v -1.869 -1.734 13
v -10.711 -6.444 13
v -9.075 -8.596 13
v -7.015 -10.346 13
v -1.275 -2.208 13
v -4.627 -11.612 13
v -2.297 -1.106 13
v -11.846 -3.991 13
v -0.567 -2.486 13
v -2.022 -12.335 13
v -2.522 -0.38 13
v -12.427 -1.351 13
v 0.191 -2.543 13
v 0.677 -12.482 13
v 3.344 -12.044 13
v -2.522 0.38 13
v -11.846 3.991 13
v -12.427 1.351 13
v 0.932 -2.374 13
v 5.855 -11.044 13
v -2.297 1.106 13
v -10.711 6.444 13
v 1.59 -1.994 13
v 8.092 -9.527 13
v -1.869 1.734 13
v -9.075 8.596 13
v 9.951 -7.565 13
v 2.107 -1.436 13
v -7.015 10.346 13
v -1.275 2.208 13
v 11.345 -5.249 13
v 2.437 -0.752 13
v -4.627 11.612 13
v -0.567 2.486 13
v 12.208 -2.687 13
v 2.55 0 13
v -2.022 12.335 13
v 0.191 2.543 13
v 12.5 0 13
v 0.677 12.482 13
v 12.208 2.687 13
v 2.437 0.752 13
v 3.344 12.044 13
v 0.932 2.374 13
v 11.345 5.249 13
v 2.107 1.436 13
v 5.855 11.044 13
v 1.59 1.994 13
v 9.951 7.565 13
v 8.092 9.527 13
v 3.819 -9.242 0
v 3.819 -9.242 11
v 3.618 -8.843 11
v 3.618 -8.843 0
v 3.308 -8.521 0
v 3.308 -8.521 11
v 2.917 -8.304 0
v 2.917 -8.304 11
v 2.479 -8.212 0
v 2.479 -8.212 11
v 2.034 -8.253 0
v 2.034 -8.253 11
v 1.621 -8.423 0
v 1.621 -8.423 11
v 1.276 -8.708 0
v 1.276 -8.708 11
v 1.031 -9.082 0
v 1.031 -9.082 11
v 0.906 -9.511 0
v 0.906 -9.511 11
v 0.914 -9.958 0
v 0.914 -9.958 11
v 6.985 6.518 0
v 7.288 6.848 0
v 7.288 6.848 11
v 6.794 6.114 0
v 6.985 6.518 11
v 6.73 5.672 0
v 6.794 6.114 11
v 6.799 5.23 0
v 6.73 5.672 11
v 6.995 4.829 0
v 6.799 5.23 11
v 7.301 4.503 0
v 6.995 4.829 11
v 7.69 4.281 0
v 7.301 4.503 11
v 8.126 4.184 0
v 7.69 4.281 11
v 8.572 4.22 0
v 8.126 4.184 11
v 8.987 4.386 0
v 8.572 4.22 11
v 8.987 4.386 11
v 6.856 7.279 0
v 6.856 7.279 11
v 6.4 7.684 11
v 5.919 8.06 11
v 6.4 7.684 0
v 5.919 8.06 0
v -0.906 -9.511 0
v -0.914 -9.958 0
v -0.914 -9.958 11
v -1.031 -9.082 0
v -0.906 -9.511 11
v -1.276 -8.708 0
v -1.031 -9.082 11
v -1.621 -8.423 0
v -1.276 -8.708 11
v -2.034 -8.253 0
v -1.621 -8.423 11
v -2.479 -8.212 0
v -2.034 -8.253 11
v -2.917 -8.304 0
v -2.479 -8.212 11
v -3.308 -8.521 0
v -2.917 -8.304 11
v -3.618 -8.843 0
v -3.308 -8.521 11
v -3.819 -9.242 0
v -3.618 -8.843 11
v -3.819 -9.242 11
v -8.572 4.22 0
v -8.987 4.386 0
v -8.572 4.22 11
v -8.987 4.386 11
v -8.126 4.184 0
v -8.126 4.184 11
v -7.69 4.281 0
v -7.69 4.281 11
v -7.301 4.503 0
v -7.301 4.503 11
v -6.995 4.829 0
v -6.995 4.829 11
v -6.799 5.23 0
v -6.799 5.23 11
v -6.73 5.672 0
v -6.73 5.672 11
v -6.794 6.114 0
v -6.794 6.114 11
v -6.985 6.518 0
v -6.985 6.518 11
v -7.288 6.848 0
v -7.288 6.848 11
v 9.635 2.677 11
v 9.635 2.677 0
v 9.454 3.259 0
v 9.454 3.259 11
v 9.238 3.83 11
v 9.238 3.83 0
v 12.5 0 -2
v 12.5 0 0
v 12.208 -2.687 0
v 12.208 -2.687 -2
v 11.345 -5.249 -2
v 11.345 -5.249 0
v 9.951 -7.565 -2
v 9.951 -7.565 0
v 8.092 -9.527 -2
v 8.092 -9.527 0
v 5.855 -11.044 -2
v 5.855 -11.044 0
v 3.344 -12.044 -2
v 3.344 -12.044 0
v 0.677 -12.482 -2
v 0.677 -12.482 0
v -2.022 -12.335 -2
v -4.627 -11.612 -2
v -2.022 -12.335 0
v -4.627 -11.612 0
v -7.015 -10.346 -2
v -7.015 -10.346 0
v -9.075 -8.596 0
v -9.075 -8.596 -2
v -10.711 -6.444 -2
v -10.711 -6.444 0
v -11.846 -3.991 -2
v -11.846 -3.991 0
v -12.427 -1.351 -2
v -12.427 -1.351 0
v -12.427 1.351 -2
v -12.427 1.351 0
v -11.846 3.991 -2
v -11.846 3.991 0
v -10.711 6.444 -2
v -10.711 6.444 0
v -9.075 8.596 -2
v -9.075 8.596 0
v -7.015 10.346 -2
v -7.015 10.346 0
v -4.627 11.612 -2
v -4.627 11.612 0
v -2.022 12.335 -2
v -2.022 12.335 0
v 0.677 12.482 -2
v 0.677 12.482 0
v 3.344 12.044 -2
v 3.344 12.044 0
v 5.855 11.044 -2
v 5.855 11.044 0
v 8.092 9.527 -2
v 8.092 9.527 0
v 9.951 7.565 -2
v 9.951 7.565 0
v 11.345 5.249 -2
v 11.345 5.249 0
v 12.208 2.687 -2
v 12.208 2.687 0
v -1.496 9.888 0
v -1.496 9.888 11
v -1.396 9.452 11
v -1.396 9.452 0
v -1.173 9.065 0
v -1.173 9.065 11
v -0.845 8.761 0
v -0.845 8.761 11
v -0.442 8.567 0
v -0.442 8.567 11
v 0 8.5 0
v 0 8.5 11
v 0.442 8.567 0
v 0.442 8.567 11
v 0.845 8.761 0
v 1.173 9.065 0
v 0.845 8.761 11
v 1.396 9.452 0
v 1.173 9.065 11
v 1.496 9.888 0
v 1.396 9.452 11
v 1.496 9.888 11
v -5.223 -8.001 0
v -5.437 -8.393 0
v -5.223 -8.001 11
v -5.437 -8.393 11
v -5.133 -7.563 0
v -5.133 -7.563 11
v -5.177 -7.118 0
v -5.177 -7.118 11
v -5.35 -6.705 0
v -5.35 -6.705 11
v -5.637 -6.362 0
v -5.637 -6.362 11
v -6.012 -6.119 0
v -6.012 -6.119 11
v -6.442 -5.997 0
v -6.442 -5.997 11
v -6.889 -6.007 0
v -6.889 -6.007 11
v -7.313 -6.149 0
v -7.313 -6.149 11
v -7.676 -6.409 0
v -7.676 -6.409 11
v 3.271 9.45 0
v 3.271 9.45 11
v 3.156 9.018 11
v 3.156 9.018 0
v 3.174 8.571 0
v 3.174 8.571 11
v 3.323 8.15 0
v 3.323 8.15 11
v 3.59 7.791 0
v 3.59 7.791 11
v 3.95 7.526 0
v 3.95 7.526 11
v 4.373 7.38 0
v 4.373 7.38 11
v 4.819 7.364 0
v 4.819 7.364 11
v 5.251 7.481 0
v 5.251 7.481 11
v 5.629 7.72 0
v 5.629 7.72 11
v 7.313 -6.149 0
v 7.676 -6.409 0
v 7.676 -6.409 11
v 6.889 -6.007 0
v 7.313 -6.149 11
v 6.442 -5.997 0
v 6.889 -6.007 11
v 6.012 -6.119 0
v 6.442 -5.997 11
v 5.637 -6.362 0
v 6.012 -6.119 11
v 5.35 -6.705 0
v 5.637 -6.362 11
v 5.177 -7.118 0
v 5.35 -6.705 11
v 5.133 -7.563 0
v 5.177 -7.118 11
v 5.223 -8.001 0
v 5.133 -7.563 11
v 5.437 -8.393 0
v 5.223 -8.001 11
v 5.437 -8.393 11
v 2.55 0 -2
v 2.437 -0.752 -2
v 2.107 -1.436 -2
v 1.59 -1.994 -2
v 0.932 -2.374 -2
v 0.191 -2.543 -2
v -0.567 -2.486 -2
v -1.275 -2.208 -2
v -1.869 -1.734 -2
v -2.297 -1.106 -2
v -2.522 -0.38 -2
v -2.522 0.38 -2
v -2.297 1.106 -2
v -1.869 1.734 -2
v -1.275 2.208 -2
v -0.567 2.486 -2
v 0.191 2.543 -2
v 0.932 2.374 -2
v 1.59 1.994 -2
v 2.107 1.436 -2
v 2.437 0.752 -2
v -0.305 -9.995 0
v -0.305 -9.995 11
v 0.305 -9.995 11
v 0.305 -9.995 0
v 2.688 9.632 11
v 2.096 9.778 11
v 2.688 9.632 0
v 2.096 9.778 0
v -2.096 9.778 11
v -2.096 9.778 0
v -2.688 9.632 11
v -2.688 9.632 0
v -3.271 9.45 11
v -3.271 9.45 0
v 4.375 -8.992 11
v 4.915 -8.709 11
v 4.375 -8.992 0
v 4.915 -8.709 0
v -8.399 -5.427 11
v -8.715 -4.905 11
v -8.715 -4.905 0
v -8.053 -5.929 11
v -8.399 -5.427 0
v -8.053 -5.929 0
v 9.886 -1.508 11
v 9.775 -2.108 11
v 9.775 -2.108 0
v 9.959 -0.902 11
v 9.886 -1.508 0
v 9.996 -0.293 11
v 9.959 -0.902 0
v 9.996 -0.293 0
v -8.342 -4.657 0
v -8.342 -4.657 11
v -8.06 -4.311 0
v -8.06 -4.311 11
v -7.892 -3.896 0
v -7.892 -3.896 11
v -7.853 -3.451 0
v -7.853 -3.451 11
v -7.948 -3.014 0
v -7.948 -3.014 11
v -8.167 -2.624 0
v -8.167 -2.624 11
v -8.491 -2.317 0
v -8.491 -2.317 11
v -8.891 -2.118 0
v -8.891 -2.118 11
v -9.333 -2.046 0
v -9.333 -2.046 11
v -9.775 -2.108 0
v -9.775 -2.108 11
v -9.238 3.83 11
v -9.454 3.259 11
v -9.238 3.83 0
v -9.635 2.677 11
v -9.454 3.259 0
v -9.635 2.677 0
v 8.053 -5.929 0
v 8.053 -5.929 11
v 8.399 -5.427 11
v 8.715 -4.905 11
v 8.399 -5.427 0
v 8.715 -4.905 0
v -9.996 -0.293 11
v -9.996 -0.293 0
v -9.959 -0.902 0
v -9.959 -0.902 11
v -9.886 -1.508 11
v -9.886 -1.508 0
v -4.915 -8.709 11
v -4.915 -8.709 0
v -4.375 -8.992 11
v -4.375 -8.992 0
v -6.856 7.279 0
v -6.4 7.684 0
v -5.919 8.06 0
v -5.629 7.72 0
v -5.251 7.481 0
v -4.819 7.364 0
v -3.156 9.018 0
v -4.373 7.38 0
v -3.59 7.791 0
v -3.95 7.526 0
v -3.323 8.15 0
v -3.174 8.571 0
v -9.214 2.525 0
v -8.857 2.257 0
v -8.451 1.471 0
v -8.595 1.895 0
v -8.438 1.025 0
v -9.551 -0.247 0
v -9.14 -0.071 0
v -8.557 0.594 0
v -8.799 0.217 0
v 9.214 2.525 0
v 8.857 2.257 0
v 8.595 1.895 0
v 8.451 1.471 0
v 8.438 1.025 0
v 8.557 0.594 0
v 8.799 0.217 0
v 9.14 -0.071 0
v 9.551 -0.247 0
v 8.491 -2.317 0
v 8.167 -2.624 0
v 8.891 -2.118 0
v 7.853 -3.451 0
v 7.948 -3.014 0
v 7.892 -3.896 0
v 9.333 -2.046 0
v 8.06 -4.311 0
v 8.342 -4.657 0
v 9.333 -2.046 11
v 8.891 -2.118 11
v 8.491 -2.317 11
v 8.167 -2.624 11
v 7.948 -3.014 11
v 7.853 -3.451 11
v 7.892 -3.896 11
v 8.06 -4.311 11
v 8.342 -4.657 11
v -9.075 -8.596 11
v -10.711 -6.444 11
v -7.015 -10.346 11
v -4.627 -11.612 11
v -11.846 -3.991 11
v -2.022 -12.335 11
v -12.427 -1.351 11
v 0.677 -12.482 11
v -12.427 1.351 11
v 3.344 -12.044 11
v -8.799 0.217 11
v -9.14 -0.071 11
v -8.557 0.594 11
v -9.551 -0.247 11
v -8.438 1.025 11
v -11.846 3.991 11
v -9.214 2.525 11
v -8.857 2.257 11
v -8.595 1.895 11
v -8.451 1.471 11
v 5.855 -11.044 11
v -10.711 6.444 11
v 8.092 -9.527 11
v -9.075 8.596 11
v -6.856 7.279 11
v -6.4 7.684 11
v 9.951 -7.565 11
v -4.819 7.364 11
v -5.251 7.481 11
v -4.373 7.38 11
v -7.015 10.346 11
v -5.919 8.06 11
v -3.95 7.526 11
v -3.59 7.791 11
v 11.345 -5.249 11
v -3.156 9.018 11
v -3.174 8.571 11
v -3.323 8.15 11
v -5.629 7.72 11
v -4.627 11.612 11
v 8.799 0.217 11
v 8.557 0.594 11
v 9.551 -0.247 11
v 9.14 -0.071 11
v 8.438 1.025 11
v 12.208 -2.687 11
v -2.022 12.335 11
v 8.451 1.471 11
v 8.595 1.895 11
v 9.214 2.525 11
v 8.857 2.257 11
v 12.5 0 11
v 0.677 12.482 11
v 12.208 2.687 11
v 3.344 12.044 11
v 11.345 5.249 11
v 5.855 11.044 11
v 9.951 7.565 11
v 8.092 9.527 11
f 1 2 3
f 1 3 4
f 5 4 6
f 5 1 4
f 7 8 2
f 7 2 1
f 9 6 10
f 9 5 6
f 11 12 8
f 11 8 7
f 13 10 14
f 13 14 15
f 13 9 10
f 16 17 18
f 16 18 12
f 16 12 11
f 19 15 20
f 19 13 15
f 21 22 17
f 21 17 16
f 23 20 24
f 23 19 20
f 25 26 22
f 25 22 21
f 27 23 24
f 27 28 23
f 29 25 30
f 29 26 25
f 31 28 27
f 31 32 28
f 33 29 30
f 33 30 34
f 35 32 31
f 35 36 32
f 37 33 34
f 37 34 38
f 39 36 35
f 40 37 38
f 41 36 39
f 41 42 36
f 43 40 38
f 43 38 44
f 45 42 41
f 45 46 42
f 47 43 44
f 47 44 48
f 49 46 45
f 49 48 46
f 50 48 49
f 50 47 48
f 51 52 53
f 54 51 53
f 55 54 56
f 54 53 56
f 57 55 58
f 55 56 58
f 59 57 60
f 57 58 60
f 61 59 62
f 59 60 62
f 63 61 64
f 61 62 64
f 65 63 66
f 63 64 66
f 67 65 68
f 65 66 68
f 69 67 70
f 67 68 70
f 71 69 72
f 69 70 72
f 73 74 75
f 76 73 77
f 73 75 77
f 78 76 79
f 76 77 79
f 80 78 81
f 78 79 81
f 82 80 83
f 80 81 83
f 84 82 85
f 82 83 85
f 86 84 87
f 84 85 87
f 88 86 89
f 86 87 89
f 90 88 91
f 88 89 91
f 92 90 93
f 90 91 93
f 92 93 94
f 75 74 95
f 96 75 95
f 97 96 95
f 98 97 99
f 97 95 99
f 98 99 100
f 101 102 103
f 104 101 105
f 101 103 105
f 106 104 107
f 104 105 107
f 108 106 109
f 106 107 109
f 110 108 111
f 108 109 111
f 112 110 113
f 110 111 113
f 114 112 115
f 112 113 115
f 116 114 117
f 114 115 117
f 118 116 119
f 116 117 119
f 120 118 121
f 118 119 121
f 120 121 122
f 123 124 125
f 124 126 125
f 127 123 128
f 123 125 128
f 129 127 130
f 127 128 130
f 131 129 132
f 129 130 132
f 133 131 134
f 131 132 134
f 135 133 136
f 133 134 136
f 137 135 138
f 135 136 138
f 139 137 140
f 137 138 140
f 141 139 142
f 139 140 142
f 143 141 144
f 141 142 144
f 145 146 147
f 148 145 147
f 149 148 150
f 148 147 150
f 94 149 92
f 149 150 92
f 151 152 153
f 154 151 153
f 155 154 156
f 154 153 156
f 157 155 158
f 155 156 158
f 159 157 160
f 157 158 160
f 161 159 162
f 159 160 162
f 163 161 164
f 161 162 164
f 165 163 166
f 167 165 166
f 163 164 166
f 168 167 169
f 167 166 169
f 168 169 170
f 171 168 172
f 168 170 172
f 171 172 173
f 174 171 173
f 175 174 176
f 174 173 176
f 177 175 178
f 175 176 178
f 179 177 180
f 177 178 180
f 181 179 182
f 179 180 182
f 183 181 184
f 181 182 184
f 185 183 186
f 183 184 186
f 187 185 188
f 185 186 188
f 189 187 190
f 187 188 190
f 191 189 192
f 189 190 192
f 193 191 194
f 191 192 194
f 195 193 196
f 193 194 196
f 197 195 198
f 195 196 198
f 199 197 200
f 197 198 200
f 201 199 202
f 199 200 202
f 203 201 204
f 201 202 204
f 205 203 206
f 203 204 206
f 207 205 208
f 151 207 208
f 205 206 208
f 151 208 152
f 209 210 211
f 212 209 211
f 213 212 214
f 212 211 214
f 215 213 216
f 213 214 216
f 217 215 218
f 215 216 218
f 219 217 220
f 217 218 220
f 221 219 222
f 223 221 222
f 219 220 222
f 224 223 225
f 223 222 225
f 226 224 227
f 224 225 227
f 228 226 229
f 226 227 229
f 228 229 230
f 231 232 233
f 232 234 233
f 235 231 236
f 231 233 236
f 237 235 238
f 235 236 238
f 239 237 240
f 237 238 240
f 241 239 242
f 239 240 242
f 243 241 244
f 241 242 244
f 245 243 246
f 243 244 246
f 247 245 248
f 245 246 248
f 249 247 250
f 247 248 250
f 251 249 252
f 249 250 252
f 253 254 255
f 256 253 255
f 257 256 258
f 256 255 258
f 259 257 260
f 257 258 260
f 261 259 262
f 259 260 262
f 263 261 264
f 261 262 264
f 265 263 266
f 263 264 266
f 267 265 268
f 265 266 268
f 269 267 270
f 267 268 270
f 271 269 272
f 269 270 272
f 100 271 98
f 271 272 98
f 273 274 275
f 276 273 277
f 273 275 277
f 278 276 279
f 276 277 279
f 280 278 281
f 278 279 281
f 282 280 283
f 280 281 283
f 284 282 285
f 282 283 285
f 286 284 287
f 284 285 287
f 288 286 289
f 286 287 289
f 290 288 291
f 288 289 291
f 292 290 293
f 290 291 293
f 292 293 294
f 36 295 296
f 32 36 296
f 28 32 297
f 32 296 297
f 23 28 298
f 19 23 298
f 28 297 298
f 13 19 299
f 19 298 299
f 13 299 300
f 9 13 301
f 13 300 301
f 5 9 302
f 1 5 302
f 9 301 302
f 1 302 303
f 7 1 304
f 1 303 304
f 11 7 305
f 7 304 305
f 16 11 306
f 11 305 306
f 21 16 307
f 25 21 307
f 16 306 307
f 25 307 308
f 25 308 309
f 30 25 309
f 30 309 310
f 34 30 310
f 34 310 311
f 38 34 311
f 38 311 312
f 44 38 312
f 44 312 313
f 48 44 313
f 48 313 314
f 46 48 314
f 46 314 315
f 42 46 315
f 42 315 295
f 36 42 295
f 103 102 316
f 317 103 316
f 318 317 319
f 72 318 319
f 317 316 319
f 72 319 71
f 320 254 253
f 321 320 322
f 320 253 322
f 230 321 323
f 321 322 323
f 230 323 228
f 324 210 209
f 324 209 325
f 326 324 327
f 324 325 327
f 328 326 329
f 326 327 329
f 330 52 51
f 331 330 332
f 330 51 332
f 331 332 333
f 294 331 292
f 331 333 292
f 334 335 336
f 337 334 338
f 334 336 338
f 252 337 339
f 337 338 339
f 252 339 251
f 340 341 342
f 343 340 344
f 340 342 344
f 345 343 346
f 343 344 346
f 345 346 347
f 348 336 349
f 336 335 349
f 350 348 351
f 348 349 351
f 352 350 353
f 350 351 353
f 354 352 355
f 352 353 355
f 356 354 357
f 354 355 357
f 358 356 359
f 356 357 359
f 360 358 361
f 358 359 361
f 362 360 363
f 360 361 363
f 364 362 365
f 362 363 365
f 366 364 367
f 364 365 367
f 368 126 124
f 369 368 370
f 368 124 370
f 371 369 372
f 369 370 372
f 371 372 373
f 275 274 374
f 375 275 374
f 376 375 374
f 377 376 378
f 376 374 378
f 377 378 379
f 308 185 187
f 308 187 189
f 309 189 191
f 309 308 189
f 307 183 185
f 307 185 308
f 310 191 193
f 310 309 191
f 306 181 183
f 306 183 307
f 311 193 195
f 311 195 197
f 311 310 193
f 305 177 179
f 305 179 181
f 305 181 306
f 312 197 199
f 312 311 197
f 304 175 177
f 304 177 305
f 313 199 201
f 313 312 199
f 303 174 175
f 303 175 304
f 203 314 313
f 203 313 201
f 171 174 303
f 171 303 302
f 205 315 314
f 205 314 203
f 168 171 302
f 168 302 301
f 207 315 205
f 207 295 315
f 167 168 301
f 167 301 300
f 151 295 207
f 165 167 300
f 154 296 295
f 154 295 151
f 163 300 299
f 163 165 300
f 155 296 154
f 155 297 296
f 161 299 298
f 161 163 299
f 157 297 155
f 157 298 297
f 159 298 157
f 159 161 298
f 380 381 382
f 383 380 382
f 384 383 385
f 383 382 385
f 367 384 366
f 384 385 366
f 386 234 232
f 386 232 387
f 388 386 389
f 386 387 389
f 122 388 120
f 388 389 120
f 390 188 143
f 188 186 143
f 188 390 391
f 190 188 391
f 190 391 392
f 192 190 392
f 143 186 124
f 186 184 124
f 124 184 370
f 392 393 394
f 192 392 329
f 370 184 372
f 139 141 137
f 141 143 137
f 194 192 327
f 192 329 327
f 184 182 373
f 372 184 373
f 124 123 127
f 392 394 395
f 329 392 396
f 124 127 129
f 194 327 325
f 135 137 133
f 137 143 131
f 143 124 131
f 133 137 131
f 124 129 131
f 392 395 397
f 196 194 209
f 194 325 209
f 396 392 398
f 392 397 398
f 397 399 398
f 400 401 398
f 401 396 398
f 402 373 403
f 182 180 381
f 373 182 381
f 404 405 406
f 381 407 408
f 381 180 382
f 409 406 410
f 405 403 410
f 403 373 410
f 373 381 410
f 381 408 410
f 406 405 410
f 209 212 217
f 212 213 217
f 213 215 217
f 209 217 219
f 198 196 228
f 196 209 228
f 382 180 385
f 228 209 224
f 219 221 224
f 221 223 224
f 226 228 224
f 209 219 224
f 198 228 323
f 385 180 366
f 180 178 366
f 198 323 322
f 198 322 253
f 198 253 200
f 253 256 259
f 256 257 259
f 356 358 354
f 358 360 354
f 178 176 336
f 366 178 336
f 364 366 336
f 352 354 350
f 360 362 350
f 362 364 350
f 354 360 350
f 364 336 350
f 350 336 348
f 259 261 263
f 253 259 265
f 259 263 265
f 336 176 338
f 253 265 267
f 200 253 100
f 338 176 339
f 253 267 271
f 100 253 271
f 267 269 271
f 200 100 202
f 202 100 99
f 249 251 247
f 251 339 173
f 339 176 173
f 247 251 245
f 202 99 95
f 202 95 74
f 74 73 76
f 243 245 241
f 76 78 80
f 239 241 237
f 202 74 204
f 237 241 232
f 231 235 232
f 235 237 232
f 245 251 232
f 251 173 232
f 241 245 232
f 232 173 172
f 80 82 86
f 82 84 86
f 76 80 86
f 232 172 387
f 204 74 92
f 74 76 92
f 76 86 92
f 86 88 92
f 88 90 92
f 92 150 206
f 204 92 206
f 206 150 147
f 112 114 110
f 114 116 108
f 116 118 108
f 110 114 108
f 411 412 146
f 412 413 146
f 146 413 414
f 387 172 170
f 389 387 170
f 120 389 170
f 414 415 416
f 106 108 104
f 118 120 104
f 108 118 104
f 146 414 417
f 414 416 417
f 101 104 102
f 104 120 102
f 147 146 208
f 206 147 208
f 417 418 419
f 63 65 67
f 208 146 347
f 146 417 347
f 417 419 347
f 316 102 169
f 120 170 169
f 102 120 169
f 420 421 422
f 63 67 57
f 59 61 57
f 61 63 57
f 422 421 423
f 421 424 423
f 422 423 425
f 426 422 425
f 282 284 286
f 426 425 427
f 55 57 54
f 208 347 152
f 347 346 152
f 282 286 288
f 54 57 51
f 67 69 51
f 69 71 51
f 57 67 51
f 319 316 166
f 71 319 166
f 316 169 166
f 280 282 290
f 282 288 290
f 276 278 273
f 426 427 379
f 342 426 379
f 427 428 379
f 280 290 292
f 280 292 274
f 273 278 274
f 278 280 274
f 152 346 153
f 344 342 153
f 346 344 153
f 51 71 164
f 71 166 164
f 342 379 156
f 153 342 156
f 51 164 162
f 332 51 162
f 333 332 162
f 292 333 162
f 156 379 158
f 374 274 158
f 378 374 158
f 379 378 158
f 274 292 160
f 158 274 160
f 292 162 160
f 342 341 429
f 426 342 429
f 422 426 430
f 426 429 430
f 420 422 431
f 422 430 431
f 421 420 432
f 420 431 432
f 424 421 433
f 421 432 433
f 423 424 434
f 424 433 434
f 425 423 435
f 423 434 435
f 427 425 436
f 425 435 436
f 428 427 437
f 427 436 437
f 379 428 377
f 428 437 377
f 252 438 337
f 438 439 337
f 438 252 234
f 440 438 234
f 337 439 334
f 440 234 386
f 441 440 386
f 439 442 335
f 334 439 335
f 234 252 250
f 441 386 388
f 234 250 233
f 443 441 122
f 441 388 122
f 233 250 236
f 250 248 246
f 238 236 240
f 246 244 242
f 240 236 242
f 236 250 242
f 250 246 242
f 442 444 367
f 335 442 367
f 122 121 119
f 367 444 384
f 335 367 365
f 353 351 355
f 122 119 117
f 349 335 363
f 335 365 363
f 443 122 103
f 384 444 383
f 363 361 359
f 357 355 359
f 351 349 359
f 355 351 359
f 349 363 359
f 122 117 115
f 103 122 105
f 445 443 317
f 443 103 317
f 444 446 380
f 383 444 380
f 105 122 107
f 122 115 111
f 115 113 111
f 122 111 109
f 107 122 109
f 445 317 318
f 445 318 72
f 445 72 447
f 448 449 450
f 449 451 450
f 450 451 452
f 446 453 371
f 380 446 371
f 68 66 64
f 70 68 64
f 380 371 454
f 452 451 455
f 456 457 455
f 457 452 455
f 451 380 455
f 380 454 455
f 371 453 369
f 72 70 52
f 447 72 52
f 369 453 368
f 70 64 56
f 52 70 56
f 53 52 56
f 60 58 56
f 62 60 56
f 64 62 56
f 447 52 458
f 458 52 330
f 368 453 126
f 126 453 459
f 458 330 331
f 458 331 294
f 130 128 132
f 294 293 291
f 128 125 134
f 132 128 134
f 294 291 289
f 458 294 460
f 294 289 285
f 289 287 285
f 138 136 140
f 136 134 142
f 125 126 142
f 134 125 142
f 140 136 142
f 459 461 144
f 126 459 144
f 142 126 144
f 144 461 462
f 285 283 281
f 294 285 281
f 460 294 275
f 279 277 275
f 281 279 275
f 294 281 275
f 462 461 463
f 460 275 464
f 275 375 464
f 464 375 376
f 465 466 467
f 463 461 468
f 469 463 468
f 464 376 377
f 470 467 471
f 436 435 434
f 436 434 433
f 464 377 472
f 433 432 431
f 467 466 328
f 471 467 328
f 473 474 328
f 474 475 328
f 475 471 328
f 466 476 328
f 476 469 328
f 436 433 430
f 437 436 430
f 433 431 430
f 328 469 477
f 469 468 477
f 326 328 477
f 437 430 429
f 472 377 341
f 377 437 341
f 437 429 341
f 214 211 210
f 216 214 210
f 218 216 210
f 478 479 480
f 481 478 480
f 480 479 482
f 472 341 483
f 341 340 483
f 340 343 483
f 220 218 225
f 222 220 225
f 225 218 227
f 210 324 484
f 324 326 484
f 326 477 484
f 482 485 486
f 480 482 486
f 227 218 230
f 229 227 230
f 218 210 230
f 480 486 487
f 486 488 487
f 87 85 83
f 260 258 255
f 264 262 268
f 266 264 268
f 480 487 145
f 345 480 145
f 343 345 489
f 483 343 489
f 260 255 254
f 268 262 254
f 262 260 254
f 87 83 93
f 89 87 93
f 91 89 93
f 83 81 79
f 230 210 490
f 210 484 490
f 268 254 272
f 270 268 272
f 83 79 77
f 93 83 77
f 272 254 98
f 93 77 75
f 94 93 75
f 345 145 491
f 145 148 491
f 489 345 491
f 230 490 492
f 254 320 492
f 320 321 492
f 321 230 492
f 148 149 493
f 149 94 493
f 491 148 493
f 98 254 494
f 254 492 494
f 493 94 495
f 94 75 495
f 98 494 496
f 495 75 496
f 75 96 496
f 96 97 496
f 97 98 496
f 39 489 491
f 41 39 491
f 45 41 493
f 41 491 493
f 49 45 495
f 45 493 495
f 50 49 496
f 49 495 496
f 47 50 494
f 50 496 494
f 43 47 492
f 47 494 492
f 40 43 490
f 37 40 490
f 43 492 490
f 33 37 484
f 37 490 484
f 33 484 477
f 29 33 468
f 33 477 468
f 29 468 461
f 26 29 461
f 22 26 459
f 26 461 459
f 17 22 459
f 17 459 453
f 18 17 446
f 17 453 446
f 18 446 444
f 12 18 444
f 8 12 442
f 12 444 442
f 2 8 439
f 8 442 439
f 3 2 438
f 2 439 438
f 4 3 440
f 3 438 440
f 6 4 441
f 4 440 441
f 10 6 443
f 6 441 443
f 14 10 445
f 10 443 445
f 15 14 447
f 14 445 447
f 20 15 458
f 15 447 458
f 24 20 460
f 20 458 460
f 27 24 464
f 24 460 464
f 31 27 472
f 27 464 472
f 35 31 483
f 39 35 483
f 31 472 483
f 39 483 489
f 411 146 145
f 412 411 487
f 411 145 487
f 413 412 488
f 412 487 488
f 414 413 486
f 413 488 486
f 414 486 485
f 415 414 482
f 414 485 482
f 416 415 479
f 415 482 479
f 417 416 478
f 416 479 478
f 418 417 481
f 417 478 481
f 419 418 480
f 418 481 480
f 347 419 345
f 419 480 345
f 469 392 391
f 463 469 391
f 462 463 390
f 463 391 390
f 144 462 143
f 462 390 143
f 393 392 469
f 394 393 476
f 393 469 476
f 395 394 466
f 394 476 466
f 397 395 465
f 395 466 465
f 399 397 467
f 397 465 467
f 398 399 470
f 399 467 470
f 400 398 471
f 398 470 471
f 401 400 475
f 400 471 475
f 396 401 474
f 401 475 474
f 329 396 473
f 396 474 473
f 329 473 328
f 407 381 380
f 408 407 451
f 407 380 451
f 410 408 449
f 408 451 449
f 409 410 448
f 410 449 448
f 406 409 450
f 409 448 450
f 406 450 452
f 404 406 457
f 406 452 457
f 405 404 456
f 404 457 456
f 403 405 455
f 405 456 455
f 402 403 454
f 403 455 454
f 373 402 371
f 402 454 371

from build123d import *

# Parameters (mm, degrees)
F0_R     = 10
F1_DEPTH = 11
F2_R     = 1.5
F3_DEPTH = 25
F4_R     = 12.5
F5_DEPTH = 2
F6_R     = 12.5
F7_DEPTH = 2
F8_R     = 2.55
F9_DEPTH = 15.001


with BuildPart() as f1:
    # F0 (on Top) → F1 (new body)
    with BuildSketch(Plane.XY):
        Circle(F0_R)
    extrude(amount=F1_DEPTH)

    # F2 (on face) → F3 (cut)
    with BuildSketch(Plane.XY.offset(11)):
        with Locations((0, 10)):
            Circle(F2_R)
        with Locations((-4.647232, 8.85456)):
            Circle(F2_R)
        with Locations((-8.229839, 5.680647)):
            Circle(F2_R)
        with Locations((-9.927089, 1.205367)):
            Circle(F2_R)
        with Locations((-9.350162, -3.546049)):
            Circle(F2_R)
        with Locations((-6.631227, -7.485107)):
            Circle(F2_R)
        with Locations((-2.393157, -9.709418)):
            Circle(F2_R)
        with Locations((2.393157, -9.709418)):
            Circle(F2_R)
        with Locations((6.631227, -7.485107)):
            Circle(F2_R)
        with Locations((9.350162, -3.546049)):
            Circle(F2_R)
        with Locations((9.927089, 1.205367)):
            Circle(F2_R)
        with Locations((8.229839, 5.680647)):
            Circle(F2_R)
        with Locations((4.647232, 8.85456)):
            Circle(F2_R)
    extrude(amount=-F3_DEPTH, mode=Mode.SUBTRACT)

    # F4 (on face) → F5 (join)
    with BuildSketch(Plane(origin=(0, 0, 0), x_dir=(1, 0, 0), z_dir=(0, 0, -1))):
        Circle(F4_R)
    extrude(amount=F5_DEPTH)

    # F6 (on face) → F7 (join)
    with BuildSketch(Plane.XY.offset(11)):
        Circle(F6_R)
    extrude(amount=F7_DEPTH)

    # F8 (on face) → F9 (cut, through all)
    with BuildSketch(Plane(origin=(0, 0, -2), x_dir=(1, 0, 0), z_dir=(0, 0, -1))):
        Circle(F8_R)
    extrude(amount=-F9_DEPTH, mode=Mode.SUBTRACT)


solid = f1.part
